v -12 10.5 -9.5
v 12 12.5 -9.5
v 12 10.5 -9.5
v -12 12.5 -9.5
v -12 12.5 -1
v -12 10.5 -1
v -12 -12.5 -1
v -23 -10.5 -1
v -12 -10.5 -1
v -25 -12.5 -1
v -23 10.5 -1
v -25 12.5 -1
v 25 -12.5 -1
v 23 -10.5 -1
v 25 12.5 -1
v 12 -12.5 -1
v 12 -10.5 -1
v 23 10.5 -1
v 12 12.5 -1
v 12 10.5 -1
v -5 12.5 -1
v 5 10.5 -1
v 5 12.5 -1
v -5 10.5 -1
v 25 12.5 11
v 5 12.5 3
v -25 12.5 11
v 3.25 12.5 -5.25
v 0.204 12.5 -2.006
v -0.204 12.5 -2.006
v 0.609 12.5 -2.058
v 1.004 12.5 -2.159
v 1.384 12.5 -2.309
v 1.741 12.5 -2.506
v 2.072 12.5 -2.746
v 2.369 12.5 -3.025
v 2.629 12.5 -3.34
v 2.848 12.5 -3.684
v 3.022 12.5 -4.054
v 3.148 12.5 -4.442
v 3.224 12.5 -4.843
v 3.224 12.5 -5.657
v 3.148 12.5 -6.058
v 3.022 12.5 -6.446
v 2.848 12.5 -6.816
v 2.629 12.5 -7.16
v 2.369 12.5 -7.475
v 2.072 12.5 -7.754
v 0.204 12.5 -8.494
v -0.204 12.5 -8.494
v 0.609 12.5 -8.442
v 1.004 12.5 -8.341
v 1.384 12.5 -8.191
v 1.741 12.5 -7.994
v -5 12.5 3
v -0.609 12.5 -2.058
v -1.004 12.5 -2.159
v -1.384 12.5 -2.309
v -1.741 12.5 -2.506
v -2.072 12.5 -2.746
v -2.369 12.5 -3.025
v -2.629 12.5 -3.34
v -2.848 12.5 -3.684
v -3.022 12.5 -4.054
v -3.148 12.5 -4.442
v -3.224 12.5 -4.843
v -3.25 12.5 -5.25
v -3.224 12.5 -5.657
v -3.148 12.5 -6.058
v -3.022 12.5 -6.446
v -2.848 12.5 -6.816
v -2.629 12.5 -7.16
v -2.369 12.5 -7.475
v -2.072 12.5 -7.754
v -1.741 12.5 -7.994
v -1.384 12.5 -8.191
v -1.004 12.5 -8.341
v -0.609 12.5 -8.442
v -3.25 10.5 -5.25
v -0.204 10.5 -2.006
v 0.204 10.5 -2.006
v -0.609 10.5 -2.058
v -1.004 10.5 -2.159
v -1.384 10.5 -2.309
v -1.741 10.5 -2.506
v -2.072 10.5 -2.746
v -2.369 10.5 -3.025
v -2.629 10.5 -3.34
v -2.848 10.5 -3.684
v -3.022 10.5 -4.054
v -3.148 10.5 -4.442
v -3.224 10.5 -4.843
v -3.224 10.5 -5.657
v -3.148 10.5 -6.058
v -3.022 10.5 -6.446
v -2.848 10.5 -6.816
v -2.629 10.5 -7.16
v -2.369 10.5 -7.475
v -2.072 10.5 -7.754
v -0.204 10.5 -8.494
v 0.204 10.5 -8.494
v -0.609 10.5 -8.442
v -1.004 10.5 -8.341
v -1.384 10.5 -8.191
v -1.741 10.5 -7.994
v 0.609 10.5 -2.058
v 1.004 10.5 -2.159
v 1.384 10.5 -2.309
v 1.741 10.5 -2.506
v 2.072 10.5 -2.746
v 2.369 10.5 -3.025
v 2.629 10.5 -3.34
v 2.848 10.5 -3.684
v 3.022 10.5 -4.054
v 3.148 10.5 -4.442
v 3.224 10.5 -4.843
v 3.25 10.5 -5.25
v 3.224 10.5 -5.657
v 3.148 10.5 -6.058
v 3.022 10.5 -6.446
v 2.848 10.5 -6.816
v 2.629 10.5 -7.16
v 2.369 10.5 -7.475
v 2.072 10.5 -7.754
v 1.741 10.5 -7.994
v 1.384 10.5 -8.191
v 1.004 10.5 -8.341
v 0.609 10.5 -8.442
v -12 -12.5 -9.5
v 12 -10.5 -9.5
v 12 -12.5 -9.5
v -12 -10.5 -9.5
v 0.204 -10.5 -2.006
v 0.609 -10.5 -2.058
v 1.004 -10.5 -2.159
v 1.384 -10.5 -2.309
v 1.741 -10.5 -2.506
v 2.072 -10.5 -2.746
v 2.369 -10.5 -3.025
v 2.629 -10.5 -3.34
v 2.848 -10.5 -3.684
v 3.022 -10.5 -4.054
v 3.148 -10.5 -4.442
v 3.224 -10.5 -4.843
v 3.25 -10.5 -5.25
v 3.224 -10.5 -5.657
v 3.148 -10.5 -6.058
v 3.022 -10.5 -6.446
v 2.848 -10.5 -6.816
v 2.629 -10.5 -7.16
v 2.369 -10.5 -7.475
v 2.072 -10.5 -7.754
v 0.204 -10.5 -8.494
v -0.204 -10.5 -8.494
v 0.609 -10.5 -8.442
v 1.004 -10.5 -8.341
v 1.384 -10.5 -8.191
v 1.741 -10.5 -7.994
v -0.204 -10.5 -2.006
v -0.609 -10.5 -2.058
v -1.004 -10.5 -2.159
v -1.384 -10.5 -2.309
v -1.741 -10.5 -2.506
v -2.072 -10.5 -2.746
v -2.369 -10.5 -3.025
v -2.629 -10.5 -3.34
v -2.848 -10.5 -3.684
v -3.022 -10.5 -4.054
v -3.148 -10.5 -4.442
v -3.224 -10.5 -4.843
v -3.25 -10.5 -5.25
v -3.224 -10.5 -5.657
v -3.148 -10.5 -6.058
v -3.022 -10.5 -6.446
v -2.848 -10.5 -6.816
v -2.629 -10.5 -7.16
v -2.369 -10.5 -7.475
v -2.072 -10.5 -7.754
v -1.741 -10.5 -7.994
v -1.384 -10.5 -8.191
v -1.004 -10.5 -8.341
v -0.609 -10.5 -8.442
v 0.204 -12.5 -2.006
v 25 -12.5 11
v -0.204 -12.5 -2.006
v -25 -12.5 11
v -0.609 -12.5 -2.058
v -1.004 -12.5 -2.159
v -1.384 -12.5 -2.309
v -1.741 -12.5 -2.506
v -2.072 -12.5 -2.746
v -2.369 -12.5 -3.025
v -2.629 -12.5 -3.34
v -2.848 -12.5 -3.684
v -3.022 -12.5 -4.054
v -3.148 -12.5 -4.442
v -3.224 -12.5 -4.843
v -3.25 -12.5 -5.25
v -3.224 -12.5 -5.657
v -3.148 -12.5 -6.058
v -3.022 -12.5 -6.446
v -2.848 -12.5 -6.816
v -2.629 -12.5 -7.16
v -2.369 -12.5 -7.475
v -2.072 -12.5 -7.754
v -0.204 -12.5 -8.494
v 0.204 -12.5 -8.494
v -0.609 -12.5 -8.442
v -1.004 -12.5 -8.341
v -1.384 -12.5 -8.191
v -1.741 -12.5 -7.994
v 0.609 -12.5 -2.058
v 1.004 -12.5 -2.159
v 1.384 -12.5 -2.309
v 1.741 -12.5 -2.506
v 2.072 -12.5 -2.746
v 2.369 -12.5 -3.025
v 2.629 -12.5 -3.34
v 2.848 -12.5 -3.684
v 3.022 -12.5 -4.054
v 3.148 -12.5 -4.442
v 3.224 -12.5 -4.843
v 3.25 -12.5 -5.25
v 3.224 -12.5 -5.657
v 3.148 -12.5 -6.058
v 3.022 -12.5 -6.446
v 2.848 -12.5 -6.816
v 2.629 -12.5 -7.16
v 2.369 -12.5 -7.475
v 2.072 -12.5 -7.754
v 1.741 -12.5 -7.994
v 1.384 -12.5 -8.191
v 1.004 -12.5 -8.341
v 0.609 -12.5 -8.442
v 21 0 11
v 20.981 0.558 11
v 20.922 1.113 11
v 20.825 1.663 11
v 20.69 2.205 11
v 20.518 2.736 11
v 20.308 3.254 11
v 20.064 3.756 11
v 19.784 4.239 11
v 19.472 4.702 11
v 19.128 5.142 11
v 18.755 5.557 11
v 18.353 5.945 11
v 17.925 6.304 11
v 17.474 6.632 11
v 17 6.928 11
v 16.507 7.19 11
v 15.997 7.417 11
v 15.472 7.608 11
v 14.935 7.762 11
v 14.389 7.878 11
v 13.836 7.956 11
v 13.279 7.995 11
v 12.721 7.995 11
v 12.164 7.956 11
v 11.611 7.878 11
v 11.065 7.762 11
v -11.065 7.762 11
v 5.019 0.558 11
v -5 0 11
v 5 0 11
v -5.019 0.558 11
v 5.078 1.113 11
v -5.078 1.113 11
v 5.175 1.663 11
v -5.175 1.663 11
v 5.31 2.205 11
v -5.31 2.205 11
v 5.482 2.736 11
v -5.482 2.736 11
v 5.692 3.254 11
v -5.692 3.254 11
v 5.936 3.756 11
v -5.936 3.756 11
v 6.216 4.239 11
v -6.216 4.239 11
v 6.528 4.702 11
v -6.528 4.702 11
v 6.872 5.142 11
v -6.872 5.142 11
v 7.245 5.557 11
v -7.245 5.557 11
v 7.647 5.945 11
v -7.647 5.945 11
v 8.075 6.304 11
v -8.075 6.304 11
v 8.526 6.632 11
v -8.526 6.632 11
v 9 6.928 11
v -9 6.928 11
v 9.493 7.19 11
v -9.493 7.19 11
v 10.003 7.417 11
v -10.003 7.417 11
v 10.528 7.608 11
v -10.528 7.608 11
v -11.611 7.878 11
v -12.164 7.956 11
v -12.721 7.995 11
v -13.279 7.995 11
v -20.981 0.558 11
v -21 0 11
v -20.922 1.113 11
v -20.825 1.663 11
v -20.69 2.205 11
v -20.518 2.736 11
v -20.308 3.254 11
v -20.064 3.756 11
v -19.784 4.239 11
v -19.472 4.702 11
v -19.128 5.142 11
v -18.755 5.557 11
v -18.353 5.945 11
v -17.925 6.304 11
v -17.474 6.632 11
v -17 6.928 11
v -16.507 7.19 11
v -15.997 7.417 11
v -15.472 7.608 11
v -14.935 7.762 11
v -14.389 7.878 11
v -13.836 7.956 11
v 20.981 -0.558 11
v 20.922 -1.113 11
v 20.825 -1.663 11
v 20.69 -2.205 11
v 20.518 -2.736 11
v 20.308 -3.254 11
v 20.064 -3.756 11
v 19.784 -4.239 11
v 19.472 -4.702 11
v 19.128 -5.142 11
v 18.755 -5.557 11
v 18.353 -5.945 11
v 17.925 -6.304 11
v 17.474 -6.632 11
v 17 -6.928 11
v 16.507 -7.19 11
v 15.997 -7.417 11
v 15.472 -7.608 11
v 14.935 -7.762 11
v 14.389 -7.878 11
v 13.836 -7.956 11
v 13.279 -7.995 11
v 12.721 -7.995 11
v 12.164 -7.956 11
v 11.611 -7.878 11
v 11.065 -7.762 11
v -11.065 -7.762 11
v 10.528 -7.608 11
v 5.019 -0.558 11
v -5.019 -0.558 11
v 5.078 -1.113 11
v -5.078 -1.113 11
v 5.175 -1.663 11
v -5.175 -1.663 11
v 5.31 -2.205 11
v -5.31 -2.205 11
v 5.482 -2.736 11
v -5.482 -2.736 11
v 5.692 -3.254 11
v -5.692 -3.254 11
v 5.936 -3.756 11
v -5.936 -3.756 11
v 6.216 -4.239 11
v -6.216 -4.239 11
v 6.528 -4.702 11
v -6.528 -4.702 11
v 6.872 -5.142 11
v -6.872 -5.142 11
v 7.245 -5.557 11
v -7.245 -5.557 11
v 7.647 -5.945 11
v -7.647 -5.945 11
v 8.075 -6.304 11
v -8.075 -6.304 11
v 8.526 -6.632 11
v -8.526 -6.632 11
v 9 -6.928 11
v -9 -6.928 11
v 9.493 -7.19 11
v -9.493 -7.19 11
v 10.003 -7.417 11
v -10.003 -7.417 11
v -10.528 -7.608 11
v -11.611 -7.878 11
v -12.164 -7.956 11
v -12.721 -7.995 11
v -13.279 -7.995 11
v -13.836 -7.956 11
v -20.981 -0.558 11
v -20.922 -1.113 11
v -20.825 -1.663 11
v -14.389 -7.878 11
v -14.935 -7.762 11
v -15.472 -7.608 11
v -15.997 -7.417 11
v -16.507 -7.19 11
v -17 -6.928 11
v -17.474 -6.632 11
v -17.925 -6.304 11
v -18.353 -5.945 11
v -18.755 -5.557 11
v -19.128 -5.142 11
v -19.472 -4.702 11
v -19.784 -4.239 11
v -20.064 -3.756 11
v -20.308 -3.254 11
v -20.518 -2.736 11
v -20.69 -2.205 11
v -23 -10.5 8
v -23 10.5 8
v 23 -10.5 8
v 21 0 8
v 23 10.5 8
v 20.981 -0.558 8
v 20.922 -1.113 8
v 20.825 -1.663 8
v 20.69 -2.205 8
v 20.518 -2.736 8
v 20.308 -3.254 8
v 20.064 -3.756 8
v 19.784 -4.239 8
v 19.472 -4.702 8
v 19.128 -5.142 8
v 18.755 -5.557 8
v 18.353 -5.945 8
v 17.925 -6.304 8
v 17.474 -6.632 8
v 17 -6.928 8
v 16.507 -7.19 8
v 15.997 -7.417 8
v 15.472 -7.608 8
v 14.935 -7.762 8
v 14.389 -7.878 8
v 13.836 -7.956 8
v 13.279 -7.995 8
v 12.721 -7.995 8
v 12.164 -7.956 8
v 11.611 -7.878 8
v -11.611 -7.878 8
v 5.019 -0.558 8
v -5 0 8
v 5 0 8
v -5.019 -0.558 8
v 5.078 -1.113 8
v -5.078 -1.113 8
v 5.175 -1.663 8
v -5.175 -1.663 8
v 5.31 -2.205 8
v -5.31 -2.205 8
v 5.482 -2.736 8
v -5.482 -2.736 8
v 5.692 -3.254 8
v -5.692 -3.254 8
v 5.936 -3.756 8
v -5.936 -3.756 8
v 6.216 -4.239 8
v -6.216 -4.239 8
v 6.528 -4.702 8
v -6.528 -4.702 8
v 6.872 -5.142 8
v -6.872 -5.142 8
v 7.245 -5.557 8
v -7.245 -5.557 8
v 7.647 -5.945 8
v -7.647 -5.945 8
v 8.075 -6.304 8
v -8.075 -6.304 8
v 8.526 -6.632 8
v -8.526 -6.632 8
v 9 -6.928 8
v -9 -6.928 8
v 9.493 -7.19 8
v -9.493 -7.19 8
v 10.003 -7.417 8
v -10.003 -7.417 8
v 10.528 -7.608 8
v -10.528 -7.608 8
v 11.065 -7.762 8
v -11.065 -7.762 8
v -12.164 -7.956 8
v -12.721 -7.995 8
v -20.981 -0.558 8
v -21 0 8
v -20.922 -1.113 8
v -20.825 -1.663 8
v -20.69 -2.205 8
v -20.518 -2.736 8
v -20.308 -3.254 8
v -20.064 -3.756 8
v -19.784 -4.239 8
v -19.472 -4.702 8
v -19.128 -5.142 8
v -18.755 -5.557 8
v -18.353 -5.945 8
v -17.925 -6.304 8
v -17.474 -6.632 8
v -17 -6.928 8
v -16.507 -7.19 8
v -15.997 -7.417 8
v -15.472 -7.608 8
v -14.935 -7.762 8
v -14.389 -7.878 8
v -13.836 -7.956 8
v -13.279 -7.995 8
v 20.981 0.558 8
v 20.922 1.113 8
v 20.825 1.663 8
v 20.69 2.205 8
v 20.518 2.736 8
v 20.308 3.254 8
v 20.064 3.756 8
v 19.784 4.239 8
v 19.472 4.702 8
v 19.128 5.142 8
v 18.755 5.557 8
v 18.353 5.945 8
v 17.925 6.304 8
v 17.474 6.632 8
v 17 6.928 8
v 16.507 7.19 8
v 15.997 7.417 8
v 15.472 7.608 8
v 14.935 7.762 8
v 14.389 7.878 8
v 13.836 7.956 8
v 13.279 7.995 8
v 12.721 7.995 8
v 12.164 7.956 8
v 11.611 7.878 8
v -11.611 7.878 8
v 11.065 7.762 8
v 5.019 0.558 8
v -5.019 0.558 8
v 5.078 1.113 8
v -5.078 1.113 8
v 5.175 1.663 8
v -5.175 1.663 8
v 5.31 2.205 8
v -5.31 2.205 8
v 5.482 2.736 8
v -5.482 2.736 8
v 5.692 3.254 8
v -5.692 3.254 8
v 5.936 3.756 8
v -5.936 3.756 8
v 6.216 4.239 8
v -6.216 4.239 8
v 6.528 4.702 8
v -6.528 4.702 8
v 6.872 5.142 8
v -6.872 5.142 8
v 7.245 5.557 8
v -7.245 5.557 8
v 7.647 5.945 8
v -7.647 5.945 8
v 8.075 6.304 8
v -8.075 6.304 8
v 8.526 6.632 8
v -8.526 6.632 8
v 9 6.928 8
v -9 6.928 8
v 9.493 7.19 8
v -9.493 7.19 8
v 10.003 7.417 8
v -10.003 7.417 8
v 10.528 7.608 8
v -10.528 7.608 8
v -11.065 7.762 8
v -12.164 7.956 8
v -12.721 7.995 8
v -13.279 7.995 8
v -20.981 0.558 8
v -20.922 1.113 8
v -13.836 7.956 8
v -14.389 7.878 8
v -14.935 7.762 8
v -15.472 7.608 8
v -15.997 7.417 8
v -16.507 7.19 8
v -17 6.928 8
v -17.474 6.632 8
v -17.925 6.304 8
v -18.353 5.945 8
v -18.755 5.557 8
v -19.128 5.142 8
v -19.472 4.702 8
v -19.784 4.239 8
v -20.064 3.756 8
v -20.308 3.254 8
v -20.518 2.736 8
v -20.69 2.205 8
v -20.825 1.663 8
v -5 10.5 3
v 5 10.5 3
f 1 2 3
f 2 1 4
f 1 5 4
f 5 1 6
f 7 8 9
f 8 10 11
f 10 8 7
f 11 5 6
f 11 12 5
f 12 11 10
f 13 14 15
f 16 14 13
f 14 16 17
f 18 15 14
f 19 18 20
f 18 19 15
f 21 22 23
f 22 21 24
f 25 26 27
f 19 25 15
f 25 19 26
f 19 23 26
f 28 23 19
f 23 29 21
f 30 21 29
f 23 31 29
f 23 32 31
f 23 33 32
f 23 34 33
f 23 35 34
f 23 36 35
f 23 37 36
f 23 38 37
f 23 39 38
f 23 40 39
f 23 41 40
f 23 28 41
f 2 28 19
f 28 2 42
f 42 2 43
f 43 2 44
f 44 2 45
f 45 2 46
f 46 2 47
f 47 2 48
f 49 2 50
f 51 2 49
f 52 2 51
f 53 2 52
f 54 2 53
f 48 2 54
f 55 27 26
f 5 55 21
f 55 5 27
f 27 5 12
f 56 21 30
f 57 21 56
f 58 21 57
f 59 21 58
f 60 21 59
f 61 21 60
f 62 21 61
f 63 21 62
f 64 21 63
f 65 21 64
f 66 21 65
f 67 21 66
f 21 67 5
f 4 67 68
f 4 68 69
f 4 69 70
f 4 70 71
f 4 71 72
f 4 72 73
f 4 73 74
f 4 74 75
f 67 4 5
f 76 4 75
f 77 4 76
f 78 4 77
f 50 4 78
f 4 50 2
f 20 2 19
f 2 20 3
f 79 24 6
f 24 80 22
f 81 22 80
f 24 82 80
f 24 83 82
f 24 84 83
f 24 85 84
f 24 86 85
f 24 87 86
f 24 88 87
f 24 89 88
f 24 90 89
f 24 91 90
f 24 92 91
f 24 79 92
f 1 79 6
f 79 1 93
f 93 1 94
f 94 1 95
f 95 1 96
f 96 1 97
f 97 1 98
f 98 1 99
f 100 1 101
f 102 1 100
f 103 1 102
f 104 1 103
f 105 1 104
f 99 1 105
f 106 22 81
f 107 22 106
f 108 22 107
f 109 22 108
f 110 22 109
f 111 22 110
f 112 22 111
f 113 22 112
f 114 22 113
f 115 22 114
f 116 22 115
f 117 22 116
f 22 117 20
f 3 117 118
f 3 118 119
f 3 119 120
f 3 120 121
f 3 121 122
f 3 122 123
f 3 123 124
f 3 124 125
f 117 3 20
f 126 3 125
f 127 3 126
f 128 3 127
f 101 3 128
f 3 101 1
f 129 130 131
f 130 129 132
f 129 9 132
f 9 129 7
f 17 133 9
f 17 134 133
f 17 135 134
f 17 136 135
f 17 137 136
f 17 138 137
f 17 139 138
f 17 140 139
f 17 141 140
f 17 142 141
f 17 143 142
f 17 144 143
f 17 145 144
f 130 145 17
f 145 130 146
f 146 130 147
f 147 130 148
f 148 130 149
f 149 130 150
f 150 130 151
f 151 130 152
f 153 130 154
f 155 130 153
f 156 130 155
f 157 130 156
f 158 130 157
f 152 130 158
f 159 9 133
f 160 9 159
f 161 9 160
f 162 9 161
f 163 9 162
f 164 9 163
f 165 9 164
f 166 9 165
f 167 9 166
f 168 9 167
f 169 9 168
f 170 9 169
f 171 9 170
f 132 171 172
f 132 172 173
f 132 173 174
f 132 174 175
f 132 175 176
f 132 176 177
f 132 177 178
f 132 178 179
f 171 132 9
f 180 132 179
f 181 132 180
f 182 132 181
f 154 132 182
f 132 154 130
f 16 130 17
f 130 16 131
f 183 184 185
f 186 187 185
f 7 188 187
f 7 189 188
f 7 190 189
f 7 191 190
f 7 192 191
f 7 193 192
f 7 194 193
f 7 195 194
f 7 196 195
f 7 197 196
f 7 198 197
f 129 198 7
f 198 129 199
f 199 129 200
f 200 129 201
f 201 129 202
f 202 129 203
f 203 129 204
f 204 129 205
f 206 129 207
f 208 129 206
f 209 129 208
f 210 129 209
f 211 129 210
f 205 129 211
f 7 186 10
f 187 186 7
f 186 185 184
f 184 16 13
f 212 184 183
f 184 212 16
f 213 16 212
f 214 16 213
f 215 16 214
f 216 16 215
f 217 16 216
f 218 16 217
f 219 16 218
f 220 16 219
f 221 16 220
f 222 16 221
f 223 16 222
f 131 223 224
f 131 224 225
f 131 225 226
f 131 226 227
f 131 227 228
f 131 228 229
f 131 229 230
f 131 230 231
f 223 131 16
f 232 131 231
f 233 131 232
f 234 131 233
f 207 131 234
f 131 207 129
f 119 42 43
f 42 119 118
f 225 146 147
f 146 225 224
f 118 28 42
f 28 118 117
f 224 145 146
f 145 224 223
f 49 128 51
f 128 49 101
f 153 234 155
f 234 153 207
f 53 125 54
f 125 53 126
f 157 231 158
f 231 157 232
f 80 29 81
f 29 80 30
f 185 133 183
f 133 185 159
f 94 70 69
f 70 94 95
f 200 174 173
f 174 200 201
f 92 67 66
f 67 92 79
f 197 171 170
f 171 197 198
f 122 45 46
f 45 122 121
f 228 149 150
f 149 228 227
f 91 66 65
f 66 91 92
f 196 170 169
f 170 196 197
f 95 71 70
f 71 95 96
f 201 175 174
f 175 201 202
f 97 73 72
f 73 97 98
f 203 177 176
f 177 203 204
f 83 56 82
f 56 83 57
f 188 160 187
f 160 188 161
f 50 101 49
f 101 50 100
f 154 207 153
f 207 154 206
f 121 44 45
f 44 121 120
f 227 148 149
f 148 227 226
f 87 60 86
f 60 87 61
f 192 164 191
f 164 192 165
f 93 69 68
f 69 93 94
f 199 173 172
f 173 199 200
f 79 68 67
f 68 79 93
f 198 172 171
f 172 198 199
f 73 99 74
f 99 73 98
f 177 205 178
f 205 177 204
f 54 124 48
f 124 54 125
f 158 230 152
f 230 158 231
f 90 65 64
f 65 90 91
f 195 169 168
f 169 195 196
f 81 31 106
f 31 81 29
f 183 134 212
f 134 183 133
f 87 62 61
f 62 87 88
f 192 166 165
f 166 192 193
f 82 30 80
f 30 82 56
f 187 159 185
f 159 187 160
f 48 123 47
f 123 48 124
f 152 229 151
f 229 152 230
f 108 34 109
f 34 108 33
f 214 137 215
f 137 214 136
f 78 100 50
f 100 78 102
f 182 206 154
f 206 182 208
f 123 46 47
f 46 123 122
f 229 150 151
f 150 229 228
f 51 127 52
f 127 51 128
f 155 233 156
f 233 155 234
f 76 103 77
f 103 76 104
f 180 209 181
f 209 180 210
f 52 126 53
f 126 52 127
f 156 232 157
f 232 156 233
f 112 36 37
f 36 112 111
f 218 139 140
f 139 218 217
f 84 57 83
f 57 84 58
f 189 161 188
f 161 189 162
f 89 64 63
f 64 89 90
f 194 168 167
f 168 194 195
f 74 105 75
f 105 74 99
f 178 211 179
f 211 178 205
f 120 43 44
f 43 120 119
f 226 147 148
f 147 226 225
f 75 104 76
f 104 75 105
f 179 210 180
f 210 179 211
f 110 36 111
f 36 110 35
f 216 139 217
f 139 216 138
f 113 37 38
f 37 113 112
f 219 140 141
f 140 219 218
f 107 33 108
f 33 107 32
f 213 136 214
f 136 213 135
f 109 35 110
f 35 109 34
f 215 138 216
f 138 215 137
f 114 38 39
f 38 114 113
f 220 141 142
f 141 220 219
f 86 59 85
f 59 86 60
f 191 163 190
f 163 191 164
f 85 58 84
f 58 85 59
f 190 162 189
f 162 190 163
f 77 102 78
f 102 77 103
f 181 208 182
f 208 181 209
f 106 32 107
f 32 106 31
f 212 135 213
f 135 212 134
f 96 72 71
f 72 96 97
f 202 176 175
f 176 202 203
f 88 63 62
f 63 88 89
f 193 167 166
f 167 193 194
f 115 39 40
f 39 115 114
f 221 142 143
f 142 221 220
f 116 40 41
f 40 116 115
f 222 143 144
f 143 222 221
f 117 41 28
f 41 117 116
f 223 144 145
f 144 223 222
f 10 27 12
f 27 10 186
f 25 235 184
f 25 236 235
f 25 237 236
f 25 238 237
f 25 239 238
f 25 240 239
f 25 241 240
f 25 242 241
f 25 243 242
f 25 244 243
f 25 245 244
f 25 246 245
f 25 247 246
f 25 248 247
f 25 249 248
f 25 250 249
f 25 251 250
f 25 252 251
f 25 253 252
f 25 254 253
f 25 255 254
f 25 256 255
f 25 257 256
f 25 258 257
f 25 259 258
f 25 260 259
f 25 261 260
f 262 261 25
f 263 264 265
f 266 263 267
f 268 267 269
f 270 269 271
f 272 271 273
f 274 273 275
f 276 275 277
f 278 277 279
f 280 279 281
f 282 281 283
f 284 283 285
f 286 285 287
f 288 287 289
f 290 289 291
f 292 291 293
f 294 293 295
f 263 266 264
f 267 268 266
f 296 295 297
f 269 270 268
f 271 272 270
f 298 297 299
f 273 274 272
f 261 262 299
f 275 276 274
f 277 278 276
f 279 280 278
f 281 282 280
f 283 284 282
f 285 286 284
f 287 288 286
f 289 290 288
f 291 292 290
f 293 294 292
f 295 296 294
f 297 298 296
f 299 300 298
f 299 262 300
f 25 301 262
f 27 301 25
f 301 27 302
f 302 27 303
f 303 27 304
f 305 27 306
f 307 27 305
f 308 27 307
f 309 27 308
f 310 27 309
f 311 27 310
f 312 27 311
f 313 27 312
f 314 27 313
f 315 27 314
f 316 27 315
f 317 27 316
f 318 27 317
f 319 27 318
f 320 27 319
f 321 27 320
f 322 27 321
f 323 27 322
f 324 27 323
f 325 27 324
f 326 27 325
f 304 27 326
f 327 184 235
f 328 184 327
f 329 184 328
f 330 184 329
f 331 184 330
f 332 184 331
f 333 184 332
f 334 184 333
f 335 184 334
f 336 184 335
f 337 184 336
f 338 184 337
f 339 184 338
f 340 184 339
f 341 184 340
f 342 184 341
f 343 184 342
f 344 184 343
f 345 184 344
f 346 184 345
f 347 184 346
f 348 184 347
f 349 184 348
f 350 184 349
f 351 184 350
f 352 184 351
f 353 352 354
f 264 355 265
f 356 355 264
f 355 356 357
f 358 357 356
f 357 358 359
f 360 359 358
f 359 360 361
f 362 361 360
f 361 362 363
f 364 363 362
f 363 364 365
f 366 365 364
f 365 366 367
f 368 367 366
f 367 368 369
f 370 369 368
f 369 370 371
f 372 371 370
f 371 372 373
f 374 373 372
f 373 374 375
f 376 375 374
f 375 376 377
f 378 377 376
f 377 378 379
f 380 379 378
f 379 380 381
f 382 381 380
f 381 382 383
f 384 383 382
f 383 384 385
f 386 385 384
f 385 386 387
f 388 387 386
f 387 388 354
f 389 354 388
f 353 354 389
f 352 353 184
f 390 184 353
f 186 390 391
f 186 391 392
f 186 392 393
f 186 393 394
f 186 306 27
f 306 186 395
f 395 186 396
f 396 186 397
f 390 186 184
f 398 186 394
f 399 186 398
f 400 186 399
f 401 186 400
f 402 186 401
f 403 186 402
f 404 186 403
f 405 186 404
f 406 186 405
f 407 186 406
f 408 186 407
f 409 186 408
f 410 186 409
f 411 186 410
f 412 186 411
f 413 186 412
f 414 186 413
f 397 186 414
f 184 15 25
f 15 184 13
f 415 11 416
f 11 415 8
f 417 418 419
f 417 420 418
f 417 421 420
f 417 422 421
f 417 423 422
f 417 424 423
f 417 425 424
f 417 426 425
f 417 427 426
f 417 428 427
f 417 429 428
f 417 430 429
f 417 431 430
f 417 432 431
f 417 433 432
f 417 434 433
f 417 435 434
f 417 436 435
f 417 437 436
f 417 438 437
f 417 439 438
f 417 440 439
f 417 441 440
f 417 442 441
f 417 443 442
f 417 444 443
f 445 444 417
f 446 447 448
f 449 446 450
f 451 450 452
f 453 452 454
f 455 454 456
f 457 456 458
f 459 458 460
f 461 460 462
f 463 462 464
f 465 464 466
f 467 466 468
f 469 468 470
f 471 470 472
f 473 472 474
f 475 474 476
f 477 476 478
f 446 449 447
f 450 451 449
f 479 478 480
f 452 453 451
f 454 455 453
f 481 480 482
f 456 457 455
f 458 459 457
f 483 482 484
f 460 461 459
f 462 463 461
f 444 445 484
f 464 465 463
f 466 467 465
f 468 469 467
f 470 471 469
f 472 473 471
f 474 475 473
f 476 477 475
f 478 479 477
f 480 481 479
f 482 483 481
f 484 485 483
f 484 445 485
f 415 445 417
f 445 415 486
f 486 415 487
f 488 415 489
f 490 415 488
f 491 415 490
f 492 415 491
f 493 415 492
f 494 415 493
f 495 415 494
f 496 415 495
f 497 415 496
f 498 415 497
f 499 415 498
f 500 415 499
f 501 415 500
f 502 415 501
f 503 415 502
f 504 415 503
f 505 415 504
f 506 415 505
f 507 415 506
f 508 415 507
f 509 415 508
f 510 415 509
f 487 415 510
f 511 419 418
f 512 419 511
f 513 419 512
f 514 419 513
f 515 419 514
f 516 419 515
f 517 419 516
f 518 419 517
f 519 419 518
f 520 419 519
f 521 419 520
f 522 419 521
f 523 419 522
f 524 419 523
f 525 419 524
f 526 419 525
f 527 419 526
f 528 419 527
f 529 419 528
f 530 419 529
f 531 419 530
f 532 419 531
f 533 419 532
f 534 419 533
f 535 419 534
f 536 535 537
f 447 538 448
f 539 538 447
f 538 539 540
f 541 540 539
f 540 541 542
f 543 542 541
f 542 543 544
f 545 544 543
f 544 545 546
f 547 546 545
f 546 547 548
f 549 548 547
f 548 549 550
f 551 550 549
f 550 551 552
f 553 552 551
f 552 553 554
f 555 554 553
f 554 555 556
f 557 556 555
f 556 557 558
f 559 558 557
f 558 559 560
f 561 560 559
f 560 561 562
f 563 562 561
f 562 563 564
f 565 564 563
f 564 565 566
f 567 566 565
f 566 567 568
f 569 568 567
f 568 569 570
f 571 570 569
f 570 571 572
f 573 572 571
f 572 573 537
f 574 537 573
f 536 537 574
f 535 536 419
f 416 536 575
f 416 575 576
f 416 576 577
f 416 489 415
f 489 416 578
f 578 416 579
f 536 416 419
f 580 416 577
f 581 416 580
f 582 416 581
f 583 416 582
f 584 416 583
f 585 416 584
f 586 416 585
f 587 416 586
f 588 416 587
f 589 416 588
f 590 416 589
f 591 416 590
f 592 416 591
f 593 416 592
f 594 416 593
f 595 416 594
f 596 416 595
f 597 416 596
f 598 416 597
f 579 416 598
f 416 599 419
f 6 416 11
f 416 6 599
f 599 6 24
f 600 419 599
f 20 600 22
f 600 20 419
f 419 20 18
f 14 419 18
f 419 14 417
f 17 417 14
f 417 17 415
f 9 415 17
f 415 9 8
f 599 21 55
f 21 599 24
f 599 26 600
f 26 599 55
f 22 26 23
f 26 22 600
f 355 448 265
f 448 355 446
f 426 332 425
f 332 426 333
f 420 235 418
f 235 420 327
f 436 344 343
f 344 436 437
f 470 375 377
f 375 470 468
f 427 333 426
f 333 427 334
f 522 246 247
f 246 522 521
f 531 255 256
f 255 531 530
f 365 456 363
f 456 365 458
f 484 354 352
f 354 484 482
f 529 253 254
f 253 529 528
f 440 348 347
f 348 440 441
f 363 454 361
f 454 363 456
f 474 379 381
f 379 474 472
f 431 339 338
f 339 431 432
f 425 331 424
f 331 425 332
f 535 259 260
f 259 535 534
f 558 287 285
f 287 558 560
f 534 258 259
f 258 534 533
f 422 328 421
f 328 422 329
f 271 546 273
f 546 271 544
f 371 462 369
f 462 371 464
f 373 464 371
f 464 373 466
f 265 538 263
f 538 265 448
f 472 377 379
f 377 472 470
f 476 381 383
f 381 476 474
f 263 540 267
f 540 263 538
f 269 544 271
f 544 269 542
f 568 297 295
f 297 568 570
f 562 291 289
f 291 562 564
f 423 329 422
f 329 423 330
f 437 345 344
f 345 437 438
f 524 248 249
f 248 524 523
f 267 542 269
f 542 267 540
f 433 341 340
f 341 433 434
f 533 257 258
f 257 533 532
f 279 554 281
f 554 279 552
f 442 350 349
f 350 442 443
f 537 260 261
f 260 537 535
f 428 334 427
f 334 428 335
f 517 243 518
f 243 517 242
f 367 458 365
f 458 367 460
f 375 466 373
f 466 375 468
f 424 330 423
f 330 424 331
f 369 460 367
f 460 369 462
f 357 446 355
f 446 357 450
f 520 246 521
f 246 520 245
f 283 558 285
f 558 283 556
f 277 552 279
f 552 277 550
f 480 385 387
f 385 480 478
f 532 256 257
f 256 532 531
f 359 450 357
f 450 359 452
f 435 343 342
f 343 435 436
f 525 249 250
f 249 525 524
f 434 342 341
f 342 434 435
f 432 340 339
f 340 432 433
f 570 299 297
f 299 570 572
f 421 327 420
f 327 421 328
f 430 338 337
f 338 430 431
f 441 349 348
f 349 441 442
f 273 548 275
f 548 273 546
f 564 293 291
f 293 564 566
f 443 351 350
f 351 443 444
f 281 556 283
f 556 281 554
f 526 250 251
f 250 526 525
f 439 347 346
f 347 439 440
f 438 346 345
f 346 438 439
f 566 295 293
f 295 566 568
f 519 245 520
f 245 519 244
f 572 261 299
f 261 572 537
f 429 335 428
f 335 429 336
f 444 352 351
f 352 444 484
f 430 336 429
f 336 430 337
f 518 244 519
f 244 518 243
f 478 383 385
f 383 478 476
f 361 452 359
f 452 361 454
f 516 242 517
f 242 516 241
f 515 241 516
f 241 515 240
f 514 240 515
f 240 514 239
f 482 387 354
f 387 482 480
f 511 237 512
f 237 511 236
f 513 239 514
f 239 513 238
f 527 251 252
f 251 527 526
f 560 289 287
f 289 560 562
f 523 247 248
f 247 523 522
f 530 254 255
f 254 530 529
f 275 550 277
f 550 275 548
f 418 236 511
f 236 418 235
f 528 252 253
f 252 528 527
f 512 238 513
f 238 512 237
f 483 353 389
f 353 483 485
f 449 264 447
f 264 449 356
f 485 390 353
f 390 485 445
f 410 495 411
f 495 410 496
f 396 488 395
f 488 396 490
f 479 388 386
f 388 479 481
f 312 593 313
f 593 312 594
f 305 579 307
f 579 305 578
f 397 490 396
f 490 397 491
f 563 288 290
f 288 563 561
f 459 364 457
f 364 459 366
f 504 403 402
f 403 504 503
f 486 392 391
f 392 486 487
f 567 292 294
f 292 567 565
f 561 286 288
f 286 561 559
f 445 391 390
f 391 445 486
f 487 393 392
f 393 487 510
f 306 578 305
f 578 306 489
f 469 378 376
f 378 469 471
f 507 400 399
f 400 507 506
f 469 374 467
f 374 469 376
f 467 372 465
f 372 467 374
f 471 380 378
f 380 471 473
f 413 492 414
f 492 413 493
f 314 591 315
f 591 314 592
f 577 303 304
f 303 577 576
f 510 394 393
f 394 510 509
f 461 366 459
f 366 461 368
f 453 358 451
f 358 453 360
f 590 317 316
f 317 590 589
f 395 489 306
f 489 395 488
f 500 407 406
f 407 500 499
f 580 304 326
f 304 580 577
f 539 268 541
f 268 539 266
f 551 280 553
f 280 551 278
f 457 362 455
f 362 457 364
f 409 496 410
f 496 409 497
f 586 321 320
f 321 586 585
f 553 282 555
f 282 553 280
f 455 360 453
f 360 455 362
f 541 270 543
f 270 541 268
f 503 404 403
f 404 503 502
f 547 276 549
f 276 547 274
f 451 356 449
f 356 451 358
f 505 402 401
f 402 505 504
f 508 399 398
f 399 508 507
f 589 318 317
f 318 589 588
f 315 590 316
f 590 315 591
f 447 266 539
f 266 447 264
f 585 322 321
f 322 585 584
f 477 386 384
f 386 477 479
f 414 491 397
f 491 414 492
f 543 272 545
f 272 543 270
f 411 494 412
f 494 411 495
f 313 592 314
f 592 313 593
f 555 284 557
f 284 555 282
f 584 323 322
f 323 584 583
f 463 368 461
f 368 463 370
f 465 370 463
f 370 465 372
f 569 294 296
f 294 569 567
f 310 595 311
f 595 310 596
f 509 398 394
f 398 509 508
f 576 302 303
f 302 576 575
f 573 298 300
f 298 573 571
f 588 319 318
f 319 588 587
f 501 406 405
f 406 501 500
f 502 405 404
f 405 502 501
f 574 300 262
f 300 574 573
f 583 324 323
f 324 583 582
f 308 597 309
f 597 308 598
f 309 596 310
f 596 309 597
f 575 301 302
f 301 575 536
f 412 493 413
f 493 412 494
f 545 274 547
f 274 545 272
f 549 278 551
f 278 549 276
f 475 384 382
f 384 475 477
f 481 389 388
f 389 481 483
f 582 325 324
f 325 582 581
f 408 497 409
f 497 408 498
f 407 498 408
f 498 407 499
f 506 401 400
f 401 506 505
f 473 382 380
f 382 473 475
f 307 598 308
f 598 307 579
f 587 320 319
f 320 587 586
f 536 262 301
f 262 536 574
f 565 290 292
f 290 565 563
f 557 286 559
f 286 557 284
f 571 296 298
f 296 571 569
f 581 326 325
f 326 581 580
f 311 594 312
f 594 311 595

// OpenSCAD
// file: shaft_mount_func.scad
echo(version=version());

transblue = [0.5,0.5,0.9,0.8];

cylWidth = 20;
cylThick = 6.5;

// Create case for "Make a bracket" from bunnings warehouse
//cyl_rail_case(56, 20, 8.5, 2);
// Create plug for above case
//mab_rail_case_plug(56,20,2);

module cyl_rail_case_plug(intwidth, intlength, thickness)
// Subsection plug for case
color("green") 
    translate([0,0,-1])
    linear_extrude(height=thickness)
        square([intwidth,intlength], center= true);


module cyl_rail_case(intwidth, intlength, intheight, thickness) {
// Case primary
    
outerlength = intlength + (thickness*2);
outerwidth = intwidth + (thickness*2);
outerheight = intheight + (thickness*2);

union() {

difference() {
union() {
translate([0,(intlength+thickness)/2,-(thickness+1+cylThick)])
linear_extrude(height=thickness + cylThick)
square(size=[(cylWidth + (thickness*2)),thickness], center=true);

translate([0,-(intlength+thickness)/2,-(thickness+1+cylThick)])
linear_extrude(height=thickness + cylThick)
square(size=[(cylWidth + (thickness*2)),thickness], center=true);
}

// For a cylindrical section mount
translate([0,intlength,-2-cylThick/2])
rotate([90,0,0])
linear_extrude(height=intlength*2)
circle(cylThick/2, $fn=50, center=true);

}


// Main section
difference() {
color(transblue)
    translate([0,0,-1])
        linear_extrude(height=intheight+thickness)
            square([outerwidth, outerlength], center=true);
color("red") 
    translate([0,0,-2])
    linear_extrude(height=intheight)
        square([intwidth,intlength], center= true);
        
color("black")
    translate([0,outerlength/2-thickness/2,-1])
    linear_extrude(height=4)
        square([10,3], center=true);
}
}

}
// main file
use <shaft_mount_func.scad>

// Main section
difference() {
cyl_rail_case(46,21,10,2);

color("red")
    translate([13,0,0])
    linear_extrude(height=16)
        circle(8,$fn=90);

color("red")
    translate([-13,0,0])
    linear_extrude(height=16)
        circle(8,$fn=90);
    
}
